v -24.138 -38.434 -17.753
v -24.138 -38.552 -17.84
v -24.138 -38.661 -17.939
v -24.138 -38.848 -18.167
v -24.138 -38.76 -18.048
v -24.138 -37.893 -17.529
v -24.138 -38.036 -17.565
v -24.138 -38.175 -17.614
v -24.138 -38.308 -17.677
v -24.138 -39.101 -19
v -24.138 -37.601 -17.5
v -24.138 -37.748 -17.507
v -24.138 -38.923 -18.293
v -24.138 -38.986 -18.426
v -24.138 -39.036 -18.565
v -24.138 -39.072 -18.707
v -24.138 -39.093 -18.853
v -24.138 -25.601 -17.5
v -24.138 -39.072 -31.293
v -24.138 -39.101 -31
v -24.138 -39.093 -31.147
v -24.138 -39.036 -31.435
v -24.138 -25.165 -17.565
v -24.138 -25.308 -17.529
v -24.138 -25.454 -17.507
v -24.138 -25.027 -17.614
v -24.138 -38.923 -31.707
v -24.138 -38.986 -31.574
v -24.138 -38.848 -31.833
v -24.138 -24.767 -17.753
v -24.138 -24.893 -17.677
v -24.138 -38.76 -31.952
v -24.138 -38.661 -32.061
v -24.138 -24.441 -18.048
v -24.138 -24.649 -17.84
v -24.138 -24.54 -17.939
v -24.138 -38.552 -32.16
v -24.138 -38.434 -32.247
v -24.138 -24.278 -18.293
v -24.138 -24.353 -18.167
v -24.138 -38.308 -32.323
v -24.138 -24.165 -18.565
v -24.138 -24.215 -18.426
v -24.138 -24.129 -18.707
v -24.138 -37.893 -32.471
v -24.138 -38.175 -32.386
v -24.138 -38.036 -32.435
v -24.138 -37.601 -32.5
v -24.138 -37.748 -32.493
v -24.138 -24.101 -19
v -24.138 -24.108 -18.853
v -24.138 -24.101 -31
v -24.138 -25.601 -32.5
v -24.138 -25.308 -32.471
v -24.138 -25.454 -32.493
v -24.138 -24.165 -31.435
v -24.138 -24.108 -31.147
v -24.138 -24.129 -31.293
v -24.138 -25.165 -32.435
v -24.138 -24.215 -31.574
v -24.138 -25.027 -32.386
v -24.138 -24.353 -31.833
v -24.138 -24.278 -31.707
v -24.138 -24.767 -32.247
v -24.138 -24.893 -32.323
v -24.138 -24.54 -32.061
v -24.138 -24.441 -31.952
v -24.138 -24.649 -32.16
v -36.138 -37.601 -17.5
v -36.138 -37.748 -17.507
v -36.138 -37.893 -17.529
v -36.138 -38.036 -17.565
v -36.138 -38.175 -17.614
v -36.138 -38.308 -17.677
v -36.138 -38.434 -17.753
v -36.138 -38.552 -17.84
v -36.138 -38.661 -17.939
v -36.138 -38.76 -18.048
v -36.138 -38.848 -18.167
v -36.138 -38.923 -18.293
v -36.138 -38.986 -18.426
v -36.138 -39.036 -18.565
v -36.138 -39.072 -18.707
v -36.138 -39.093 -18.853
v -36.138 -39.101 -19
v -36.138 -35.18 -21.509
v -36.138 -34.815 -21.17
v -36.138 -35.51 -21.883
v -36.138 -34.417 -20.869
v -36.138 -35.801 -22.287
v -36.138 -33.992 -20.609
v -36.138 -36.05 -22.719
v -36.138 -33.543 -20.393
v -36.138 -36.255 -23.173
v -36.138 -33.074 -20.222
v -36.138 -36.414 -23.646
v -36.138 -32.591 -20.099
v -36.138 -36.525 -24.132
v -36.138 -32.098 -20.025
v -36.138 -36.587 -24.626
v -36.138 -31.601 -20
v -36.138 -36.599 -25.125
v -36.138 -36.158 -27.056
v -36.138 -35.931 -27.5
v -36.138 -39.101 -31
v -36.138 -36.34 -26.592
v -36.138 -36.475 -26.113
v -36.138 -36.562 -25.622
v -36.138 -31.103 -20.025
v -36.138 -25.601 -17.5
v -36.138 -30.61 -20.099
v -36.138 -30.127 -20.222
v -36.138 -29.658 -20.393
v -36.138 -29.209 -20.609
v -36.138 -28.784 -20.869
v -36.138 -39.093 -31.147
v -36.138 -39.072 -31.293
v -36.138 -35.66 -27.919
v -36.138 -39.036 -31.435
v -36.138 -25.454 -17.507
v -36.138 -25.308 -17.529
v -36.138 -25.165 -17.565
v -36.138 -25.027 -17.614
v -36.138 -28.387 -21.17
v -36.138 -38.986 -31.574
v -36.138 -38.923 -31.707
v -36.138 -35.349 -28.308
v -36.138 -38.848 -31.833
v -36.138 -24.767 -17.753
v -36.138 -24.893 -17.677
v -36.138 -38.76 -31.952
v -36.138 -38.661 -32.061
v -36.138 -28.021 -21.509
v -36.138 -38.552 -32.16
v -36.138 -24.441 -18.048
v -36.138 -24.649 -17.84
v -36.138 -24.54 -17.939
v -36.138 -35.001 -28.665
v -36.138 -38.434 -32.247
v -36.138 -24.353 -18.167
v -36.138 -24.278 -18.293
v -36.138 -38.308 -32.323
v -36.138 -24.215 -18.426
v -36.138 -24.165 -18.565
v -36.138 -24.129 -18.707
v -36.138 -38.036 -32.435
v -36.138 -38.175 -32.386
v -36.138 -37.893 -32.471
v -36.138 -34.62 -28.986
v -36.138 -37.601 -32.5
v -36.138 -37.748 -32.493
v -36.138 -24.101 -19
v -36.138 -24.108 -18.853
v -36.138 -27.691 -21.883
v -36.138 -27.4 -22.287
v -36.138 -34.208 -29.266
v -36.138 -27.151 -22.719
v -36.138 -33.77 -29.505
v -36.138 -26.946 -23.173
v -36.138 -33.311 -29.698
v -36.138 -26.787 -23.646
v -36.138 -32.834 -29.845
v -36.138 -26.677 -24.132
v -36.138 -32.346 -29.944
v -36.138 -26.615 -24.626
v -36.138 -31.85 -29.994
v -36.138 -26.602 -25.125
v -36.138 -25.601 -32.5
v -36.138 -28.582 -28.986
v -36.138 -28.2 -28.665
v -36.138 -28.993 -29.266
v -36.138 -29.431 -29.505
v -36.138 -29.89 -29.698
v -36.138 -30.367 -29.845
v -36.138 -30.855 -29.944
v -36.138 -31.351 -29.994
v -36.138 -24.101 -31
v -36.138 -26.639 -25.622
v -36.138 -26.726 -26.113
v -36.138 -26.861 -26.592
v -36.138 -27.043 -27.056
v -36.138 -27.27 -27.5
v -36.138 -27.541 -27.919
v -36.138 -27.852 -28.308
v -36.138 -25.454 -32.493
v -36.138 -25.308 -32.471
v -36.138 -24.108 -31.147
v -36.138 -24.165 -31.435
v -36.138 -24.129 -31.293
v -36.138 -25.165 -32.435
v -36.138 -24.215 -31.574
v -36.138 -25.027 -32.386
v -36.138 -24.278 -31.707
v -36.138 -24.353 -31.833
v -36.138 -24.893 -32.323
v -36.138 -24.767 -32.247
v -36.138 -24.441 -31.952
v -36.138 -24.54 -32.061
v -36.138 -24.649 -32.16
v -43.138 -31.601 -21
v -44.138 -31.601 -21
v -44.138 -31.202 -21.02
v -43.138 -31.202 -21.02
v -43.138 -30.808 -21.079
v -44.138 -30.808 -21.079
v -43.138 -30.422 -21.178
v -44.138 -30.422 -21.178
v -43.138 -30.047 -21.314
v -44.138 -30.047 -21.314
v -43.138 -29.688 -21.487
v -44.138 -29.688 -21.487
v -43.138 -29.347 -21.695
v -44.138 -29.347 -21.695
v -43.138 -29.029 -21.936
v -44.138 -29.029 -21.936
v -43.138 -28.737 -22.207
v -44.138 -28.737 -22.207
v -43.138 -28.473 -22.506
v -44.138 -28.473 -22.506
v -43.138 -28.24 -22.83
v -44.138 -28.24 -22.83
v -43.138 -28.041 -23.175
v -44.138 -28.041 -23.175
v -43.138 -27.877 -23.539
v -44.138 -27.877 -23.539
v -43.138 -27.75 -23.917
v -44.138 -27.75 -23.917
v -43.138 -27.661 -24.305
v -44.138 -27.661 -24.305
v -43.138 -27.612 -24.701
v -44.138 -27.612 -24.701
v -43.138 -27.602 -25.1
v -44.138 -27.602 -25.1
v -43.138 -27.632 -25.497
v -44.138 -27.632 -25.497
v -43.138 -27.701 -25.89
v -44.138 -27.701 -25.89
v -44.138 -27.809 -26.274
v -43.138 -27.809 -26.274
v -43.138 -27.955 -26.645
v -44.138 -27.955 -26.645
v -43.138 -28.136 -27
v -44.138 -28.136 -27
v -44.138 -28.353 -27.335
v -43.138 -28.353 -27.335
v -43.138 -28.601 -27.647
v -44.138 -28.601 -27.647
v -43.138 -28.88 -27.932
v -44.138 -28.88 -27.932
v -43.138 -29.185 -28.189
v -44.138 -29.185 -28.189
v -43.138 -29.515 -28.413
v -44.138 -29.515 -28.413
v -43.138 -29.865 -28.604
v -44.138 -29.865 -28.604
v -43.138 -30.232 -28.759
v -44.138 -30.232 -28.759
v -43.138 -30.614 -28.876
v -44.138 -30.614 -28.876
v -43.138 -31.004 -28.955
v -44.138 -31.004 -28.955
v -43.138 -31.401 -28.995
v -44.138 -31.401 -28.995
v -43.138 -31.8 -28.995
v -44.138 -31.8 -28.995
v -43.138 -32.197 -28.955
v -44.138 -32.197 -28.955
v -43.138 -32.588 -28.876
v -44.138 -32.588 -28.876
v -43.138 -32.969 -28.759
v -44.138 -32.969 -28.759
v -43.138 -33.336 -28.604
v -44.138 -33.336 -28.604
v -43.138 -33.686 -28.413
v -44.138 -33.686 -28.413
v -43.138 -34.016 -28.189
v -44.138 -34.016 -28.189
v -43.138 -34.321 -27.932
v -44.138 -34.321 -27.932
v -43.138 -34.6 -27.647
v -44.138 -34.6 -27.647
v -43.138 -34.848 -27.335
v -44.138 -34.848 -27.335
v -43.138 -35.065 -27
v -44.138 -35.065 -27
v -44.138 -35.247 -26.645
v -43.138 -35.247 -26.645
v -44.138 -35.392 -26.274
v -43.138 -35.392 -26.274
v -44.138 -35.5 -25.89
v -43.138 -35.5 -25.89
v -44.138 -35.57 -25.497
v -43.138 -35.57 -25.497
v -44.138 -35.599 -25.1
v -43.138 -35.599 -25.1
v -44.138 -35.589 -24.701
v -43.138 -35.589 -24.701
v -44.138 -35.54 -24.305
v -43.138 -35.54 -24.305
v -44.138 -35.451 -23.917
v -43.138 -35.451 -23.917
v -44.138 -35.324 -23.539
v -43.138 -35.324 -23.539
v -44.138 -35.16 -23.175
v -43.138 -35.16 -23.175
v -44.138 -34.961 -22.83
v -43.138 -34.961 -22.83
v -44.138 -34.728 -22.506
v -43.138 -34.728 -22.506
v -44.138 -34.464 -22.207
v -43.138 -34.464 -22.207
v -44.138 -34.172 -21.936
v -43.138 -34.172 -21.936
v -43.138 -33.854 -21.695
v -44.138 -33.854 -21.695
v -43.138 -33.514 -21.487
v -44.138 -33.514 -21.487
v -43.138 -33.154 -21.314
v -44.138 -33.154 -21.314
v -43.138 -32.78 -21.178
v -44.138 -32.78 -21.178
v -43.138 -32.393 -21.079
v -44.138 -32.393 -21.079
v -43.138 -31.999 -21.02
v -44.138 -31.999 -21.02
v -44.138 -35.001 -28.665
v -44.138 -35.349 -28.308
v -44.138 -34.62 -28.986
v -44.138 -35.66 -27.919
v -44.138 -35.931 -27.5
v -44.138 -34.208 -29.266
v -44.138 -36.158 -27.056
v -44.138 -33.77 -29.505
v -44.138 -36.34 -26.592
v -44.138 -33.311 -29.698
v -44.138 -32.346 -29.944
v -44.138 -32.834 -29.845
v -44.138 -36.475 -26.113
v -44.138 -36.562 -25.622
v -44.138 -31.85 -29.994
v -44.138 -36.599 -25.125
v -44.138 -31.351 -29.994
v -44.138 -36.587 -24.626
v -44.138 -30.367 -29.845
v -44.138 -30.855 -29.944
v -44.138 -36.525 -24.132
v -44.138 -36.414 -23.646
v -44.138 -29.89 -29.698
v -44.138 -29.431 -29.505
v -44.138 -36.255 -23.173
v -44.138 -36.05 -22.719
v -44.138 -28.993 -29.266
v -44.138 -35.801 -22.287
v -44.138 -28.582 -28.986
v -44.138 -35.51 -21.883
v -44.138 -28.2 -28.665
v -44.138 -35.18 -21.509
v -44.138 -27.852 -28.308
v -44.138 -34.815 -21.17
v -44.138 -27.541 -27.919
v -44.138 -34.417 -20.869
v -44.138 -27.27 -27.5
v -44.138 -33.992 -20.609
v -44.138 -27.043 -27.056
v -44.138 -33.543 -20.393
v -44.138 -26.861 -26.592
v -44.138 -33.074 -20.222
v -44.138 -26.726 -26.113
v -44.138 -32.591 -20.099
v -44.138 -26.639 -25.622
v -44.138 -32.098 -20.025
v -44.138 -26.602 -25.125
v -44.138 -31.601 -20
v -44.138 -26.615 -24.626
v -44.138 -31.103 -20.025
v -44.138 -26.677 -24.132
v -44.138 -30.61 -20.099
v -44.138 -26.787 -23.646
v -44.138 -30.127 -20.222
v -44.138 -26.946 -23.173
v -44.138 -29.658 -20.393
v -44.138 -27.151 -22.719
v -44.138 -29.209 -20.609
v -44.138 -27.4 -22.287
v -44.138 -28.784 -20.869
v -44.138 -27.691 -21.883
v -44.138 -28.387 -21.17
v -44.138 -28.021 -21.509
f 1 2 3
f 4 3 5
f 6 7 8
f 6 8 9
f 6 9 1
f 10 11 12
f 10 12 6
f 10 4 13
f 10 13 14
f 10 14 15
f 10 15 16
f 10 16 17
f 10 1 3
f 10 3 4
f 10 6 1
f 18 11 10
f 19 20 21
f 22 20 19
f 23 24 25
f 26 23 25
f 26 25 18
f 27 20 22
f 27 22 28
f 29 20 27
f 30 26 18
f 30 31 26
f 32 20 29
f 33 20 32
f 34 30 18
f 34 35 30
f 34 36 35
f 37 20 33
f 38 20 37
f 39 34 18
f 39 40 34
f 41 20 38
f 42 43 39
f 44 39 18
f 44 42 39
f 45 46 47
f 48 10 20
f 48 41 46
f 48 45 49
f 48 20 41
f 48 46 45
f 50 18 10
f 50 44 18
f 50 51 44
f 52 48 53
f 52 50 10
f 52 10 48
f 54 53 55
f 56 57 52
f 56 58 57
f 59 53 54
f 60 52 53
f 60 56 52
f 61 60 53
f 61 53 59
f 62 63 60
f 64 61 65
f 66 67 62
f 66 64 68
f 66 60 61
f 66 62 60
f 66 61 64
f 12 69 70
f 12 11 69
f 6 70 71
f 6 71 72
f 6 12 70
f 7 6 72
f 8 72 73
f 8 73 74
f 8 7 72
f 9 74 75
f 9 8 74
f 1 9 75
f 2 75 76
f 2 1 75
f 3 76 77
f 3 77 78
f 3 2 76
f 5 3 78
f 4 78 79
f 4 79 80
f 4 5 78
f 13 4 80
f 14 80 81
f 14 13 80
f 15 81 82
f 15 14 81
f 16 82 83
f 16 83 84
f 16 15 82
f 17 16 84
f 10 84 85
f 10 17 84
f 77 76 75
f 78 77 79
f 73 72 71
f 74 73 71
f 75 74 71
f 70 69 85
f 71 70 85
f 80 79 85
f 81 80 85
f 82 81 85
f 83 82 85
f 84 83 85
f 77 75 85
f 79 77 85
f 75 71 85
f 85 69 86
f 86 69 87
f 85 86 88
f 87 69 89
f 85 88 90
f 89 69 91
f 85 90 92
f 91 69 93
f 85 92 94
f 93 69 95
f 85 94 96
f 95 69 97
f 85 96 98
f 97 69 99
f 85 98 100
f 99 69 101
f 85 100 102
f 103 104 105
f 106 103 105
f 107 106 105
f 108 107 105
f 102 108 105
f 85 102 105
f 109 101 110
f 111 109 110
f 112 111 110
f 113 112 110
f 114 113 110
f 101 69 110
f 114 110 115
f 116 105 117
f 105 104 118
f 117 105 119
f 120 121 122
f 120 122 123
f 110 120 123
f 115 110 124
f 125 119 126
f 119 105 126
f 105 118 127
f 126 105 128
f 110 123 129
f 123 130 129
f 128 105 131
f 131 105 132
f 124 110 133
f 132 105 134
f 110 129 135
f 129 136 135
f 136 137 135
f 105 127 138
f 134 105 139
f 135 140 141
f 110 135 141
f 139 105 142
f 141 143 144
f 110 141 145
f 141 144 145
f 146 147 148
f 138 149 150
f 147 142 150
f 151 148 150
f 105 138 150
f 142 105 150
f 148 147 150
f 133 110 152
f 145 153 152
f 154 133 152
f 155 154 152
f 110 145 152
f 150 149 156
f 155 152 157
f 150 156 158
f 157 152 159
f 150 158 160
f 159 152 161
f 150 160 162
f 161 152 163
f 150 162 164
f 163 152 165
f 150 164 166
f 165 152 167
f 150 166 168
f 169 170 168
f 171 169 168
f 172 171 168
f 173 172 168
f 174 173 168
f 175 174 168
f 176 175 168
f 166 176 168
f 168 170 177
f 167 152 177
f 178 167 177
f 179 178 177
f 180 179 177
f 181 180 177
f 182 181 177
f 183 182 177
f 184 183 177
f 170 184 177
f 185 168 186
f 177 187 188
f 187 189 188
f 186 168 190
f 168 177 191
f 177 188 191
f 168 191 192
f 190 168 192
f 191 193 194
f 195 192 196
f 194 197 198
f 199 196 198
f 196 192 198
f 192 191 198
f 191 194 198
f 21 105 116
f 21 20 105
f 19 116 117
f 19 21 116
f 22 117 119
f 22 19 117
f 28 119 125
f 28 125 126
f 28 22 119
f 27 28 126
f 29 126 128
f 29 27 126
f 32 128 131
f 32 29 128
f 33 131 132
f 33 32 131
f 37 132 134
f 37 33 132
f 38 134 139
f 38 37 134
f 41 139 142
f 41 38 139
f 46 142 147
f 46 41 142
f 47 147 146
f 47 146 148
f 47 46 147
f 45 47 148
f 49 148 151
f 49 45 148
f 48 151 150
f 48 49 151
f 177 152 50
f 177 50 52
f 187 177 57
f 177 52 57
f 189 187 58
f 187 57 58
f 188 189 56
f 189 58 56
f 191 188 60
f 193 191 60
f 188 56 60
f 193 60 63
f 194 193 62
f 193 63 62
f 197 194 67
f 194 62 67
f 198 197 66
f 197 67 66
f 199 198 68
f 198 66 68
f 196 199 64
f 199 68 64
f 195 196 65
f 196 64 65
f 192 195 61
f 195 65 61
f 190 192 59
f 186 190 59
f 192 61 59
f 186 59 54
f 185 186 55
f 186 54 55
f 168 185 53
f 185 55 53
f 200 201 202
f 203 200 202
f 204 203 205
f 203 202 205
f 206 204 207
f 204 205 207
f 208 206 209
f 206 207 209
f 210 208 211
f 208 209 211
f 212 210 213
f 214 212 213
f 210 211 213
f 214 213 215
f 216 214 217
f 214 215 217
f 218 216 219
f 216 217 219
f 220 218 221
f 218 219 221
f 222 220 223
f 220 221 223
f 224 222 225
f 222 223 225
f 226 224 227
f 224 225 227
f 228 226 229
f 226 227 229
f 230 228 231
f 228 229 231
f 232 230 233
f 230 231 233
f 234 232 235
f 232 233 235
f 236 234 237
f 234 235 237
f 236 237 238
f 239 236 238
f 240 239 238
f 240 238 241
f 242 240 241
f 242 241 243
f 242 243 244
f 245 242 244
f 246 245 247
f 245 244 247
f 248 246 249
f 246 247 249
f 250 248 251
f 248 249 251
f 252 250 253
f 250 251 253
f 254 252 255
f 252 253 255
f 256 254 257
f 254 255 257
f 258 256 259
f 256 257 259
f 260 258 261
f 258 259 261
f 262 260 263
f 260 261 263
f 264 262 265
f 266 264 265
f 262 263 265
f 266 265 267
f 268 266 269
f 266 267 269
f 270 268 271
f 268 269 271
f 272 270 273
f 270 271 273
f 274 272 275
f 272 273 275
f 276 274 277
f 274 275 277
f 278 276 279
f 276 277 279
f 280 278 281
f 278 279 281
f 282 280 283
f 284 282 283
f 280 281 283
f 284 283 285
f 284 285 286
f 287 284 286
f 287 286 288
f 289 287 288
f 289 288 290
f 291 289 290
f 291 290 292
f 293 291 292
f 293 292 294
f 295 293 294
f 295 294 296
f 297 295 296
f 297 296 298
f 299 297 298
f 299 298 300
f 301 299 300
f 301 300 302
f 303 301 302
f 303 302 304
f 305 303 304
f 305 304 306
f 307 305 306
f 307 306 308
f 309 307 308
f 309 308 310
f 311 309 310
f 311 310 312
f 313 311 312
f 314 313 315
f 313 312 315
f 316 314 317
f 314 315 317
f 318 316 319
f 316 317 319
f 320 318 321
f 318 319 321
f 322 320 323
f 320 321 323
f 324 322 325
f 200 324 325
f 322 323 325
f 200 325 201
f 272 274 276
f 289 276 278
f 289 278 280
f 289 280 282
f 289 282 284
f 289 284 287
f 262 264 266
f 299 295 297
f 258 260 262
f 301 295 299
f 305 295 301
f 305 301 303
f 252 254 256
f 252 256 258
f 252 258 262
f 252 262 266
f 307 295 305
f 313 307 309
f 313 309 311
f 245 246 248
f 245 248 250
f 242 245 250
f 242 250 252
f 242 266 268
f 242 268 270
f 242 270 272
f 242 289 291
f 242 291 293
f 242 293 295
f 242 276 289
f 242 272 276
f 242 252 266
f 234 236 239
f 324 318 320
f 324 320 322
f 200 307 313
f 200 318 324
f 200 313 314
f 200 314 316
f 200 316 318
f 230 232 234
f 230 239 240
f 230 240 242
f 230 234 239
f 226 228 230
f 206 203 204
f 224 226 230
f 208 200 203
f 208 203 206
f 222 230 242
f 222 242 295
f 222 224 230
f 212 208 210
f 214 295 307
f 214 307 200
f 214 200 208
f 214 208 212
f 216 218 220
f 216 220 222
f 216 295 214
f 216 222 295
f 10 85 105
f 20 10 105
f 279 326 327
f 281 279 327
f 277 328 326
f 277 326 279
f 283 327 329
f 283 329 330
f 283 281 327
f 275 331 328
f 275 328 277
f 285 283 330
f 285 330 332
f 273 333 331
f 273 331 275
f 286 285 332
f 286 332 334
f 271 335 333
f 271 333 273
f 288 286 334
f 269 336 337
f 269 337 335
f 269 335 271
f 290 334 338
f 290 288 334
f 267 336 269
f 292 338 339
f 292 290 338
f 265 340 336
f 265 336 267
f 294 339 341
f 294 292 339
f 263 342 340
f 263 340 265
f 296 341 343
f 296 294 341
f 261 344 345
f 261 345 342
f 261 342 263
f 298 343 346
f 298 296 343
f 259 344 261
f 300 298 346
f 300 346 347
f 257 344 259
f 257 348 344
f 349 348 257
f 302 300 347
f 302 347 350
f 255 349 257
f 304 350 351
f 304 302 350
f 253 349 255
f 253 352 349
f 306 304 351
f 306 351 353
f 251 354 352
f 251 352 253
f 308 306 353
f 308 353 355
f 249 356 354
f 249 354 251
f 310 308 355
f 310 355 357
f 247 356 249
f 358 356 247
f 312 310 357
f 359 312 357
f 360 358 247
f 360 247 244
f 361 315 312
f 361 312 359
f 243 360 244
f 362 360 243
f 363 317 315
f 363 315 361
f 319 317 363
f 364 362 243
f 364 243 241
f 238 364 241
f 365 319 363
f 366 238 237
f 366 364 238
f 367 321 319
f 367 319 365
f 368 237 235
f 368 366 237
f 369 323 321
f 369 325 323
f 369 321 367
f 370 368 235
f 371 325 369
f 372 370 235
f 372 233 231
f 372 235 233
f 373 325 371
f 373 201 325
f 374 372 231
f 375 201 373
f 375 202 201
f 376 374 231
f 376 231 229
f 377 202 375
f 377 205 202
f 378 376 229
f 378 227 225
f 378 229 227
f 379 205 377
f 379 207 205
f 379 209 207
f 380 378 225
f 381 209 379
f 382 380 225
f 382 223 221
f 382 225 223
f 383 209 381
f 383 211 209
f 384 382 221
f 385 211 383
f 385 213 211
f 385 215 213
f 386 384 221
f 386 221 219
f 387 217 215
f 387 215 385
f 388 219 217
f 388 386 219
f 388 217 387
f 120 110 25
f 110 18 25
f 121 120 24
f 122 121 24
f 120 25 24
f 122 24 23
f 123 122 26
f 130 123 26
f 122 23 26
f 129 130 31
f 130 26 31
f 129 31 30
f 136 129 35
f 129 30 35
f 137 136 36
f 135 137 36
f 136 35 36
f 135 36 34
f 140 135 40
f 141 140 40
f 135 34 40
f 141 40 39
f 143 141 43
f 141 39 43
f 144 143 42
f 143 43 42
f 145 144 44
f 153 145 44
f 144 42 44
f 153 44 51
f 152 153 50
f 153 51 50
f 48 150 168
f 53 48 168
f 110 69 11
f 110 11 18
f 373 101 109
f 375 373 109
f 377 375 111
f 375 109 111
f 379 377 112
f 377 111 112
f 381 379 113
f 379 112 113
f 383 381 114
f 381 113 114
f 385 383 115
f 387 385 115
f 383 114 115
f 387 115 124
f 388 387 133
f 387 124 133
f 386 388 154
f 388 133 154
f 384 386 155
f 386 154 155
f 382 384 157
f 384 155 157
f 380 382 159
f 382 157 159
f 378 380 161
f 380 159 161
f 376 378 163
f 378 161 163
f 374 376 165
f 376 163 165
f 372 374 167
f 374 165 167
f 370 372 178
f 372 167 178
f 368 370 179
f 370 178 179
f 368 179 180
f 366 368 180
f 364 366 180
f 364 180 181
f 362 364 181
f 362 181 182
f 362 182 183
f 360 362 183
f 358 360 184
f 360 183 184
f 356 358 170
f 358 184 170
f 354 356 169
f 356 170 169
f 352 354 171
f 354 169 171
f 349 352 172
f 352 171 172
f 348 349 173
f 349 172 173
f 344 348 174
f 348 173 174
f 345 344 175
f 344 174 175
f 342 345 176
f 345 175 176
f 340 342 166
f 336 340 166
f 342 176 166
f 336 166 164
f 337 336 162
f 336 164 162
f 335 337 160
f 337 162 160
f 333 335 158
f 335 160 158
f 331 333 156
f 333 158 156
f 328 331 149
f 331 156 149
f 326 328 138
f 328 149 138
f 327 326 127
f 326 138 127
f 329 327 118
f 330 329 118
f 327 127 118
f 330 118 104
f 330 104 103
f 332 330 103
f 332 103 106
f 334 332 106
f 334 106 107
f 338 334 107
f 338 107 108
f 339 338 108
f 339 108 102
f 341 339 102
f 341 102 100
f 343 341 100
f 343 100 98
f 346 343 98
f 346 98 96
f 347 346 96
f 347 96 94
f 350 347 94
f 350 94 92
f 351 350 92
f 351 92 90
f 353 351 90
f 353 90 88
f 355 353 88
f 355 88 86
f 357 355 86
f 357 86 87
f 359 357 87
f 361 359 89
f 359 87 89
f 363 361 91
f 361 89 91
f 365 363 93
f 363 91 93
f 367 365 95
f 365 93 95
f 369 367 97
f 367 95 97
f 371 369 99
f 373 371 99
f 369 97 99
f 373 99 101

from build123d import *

# Parameters (mm, degrees)
SKETCH2_R           = 5
BOSS_EXTRUDE1_DEPTH = 8
SKETCH3_W           = 15
SKETCH3_H           = 15
BOSS_EXTRUDE2_DEPTH = 12
SKETCH4_R           = 4
CUT_EXTRUDE1_DEPTH  = 1
FILLET1_R           = 1.5


with BuildPart() as part:
    # Sketch2 → Boss-Extrude1 (new body)
    with BuildSketch(Plane.ZY.offset(36.137829577)):
        with Locations((-25, -31.600577771)):
            Circle(SKETCH2_R)
    extrude(amount=BOSS_EXTRUDE1_DEPTH)

    # Sketch3 → Boss-Extrude2 (add)
    with BuildSketch(Plane(origin=(-36.137829577, 0, 0), x_dir=(0, 0, -1), z_dir=(1, 0, 0))):
        with Locations((25, -31.600577771)):
            Rectangle(SKETCH3_W, SKETCH3_H)
    extrude(amount=BOSS_EXTRUDE2_DEPTH)

    # Sketch4 → Cut-Extrude1 (cut)
    with BuildSketch(Plane.ZY.offset(44.137829577)):
        with Locations((-25, -31.600577771)):
            Circle(SKETCH4_R)
    extrude(amount=-CUT_EXTRUDE1_DEPTH, mode=Mode.SUBTRACT)

    # Fillet1
    fillet1_edges = [part.edges().sort_by_distance(p)[0] for p in [
        (-30.137829577, -24.100577771, -17.5),
        (-30.137829577, -24.100577771, -32.5),
        (-30.137829577, -39.100577771, -17.5),
        (-30.137829577, -39.100577771, -32.5),
    ]]
    fillet(fillet1_edges, radius=FILLET1_R)


solid = part.part
